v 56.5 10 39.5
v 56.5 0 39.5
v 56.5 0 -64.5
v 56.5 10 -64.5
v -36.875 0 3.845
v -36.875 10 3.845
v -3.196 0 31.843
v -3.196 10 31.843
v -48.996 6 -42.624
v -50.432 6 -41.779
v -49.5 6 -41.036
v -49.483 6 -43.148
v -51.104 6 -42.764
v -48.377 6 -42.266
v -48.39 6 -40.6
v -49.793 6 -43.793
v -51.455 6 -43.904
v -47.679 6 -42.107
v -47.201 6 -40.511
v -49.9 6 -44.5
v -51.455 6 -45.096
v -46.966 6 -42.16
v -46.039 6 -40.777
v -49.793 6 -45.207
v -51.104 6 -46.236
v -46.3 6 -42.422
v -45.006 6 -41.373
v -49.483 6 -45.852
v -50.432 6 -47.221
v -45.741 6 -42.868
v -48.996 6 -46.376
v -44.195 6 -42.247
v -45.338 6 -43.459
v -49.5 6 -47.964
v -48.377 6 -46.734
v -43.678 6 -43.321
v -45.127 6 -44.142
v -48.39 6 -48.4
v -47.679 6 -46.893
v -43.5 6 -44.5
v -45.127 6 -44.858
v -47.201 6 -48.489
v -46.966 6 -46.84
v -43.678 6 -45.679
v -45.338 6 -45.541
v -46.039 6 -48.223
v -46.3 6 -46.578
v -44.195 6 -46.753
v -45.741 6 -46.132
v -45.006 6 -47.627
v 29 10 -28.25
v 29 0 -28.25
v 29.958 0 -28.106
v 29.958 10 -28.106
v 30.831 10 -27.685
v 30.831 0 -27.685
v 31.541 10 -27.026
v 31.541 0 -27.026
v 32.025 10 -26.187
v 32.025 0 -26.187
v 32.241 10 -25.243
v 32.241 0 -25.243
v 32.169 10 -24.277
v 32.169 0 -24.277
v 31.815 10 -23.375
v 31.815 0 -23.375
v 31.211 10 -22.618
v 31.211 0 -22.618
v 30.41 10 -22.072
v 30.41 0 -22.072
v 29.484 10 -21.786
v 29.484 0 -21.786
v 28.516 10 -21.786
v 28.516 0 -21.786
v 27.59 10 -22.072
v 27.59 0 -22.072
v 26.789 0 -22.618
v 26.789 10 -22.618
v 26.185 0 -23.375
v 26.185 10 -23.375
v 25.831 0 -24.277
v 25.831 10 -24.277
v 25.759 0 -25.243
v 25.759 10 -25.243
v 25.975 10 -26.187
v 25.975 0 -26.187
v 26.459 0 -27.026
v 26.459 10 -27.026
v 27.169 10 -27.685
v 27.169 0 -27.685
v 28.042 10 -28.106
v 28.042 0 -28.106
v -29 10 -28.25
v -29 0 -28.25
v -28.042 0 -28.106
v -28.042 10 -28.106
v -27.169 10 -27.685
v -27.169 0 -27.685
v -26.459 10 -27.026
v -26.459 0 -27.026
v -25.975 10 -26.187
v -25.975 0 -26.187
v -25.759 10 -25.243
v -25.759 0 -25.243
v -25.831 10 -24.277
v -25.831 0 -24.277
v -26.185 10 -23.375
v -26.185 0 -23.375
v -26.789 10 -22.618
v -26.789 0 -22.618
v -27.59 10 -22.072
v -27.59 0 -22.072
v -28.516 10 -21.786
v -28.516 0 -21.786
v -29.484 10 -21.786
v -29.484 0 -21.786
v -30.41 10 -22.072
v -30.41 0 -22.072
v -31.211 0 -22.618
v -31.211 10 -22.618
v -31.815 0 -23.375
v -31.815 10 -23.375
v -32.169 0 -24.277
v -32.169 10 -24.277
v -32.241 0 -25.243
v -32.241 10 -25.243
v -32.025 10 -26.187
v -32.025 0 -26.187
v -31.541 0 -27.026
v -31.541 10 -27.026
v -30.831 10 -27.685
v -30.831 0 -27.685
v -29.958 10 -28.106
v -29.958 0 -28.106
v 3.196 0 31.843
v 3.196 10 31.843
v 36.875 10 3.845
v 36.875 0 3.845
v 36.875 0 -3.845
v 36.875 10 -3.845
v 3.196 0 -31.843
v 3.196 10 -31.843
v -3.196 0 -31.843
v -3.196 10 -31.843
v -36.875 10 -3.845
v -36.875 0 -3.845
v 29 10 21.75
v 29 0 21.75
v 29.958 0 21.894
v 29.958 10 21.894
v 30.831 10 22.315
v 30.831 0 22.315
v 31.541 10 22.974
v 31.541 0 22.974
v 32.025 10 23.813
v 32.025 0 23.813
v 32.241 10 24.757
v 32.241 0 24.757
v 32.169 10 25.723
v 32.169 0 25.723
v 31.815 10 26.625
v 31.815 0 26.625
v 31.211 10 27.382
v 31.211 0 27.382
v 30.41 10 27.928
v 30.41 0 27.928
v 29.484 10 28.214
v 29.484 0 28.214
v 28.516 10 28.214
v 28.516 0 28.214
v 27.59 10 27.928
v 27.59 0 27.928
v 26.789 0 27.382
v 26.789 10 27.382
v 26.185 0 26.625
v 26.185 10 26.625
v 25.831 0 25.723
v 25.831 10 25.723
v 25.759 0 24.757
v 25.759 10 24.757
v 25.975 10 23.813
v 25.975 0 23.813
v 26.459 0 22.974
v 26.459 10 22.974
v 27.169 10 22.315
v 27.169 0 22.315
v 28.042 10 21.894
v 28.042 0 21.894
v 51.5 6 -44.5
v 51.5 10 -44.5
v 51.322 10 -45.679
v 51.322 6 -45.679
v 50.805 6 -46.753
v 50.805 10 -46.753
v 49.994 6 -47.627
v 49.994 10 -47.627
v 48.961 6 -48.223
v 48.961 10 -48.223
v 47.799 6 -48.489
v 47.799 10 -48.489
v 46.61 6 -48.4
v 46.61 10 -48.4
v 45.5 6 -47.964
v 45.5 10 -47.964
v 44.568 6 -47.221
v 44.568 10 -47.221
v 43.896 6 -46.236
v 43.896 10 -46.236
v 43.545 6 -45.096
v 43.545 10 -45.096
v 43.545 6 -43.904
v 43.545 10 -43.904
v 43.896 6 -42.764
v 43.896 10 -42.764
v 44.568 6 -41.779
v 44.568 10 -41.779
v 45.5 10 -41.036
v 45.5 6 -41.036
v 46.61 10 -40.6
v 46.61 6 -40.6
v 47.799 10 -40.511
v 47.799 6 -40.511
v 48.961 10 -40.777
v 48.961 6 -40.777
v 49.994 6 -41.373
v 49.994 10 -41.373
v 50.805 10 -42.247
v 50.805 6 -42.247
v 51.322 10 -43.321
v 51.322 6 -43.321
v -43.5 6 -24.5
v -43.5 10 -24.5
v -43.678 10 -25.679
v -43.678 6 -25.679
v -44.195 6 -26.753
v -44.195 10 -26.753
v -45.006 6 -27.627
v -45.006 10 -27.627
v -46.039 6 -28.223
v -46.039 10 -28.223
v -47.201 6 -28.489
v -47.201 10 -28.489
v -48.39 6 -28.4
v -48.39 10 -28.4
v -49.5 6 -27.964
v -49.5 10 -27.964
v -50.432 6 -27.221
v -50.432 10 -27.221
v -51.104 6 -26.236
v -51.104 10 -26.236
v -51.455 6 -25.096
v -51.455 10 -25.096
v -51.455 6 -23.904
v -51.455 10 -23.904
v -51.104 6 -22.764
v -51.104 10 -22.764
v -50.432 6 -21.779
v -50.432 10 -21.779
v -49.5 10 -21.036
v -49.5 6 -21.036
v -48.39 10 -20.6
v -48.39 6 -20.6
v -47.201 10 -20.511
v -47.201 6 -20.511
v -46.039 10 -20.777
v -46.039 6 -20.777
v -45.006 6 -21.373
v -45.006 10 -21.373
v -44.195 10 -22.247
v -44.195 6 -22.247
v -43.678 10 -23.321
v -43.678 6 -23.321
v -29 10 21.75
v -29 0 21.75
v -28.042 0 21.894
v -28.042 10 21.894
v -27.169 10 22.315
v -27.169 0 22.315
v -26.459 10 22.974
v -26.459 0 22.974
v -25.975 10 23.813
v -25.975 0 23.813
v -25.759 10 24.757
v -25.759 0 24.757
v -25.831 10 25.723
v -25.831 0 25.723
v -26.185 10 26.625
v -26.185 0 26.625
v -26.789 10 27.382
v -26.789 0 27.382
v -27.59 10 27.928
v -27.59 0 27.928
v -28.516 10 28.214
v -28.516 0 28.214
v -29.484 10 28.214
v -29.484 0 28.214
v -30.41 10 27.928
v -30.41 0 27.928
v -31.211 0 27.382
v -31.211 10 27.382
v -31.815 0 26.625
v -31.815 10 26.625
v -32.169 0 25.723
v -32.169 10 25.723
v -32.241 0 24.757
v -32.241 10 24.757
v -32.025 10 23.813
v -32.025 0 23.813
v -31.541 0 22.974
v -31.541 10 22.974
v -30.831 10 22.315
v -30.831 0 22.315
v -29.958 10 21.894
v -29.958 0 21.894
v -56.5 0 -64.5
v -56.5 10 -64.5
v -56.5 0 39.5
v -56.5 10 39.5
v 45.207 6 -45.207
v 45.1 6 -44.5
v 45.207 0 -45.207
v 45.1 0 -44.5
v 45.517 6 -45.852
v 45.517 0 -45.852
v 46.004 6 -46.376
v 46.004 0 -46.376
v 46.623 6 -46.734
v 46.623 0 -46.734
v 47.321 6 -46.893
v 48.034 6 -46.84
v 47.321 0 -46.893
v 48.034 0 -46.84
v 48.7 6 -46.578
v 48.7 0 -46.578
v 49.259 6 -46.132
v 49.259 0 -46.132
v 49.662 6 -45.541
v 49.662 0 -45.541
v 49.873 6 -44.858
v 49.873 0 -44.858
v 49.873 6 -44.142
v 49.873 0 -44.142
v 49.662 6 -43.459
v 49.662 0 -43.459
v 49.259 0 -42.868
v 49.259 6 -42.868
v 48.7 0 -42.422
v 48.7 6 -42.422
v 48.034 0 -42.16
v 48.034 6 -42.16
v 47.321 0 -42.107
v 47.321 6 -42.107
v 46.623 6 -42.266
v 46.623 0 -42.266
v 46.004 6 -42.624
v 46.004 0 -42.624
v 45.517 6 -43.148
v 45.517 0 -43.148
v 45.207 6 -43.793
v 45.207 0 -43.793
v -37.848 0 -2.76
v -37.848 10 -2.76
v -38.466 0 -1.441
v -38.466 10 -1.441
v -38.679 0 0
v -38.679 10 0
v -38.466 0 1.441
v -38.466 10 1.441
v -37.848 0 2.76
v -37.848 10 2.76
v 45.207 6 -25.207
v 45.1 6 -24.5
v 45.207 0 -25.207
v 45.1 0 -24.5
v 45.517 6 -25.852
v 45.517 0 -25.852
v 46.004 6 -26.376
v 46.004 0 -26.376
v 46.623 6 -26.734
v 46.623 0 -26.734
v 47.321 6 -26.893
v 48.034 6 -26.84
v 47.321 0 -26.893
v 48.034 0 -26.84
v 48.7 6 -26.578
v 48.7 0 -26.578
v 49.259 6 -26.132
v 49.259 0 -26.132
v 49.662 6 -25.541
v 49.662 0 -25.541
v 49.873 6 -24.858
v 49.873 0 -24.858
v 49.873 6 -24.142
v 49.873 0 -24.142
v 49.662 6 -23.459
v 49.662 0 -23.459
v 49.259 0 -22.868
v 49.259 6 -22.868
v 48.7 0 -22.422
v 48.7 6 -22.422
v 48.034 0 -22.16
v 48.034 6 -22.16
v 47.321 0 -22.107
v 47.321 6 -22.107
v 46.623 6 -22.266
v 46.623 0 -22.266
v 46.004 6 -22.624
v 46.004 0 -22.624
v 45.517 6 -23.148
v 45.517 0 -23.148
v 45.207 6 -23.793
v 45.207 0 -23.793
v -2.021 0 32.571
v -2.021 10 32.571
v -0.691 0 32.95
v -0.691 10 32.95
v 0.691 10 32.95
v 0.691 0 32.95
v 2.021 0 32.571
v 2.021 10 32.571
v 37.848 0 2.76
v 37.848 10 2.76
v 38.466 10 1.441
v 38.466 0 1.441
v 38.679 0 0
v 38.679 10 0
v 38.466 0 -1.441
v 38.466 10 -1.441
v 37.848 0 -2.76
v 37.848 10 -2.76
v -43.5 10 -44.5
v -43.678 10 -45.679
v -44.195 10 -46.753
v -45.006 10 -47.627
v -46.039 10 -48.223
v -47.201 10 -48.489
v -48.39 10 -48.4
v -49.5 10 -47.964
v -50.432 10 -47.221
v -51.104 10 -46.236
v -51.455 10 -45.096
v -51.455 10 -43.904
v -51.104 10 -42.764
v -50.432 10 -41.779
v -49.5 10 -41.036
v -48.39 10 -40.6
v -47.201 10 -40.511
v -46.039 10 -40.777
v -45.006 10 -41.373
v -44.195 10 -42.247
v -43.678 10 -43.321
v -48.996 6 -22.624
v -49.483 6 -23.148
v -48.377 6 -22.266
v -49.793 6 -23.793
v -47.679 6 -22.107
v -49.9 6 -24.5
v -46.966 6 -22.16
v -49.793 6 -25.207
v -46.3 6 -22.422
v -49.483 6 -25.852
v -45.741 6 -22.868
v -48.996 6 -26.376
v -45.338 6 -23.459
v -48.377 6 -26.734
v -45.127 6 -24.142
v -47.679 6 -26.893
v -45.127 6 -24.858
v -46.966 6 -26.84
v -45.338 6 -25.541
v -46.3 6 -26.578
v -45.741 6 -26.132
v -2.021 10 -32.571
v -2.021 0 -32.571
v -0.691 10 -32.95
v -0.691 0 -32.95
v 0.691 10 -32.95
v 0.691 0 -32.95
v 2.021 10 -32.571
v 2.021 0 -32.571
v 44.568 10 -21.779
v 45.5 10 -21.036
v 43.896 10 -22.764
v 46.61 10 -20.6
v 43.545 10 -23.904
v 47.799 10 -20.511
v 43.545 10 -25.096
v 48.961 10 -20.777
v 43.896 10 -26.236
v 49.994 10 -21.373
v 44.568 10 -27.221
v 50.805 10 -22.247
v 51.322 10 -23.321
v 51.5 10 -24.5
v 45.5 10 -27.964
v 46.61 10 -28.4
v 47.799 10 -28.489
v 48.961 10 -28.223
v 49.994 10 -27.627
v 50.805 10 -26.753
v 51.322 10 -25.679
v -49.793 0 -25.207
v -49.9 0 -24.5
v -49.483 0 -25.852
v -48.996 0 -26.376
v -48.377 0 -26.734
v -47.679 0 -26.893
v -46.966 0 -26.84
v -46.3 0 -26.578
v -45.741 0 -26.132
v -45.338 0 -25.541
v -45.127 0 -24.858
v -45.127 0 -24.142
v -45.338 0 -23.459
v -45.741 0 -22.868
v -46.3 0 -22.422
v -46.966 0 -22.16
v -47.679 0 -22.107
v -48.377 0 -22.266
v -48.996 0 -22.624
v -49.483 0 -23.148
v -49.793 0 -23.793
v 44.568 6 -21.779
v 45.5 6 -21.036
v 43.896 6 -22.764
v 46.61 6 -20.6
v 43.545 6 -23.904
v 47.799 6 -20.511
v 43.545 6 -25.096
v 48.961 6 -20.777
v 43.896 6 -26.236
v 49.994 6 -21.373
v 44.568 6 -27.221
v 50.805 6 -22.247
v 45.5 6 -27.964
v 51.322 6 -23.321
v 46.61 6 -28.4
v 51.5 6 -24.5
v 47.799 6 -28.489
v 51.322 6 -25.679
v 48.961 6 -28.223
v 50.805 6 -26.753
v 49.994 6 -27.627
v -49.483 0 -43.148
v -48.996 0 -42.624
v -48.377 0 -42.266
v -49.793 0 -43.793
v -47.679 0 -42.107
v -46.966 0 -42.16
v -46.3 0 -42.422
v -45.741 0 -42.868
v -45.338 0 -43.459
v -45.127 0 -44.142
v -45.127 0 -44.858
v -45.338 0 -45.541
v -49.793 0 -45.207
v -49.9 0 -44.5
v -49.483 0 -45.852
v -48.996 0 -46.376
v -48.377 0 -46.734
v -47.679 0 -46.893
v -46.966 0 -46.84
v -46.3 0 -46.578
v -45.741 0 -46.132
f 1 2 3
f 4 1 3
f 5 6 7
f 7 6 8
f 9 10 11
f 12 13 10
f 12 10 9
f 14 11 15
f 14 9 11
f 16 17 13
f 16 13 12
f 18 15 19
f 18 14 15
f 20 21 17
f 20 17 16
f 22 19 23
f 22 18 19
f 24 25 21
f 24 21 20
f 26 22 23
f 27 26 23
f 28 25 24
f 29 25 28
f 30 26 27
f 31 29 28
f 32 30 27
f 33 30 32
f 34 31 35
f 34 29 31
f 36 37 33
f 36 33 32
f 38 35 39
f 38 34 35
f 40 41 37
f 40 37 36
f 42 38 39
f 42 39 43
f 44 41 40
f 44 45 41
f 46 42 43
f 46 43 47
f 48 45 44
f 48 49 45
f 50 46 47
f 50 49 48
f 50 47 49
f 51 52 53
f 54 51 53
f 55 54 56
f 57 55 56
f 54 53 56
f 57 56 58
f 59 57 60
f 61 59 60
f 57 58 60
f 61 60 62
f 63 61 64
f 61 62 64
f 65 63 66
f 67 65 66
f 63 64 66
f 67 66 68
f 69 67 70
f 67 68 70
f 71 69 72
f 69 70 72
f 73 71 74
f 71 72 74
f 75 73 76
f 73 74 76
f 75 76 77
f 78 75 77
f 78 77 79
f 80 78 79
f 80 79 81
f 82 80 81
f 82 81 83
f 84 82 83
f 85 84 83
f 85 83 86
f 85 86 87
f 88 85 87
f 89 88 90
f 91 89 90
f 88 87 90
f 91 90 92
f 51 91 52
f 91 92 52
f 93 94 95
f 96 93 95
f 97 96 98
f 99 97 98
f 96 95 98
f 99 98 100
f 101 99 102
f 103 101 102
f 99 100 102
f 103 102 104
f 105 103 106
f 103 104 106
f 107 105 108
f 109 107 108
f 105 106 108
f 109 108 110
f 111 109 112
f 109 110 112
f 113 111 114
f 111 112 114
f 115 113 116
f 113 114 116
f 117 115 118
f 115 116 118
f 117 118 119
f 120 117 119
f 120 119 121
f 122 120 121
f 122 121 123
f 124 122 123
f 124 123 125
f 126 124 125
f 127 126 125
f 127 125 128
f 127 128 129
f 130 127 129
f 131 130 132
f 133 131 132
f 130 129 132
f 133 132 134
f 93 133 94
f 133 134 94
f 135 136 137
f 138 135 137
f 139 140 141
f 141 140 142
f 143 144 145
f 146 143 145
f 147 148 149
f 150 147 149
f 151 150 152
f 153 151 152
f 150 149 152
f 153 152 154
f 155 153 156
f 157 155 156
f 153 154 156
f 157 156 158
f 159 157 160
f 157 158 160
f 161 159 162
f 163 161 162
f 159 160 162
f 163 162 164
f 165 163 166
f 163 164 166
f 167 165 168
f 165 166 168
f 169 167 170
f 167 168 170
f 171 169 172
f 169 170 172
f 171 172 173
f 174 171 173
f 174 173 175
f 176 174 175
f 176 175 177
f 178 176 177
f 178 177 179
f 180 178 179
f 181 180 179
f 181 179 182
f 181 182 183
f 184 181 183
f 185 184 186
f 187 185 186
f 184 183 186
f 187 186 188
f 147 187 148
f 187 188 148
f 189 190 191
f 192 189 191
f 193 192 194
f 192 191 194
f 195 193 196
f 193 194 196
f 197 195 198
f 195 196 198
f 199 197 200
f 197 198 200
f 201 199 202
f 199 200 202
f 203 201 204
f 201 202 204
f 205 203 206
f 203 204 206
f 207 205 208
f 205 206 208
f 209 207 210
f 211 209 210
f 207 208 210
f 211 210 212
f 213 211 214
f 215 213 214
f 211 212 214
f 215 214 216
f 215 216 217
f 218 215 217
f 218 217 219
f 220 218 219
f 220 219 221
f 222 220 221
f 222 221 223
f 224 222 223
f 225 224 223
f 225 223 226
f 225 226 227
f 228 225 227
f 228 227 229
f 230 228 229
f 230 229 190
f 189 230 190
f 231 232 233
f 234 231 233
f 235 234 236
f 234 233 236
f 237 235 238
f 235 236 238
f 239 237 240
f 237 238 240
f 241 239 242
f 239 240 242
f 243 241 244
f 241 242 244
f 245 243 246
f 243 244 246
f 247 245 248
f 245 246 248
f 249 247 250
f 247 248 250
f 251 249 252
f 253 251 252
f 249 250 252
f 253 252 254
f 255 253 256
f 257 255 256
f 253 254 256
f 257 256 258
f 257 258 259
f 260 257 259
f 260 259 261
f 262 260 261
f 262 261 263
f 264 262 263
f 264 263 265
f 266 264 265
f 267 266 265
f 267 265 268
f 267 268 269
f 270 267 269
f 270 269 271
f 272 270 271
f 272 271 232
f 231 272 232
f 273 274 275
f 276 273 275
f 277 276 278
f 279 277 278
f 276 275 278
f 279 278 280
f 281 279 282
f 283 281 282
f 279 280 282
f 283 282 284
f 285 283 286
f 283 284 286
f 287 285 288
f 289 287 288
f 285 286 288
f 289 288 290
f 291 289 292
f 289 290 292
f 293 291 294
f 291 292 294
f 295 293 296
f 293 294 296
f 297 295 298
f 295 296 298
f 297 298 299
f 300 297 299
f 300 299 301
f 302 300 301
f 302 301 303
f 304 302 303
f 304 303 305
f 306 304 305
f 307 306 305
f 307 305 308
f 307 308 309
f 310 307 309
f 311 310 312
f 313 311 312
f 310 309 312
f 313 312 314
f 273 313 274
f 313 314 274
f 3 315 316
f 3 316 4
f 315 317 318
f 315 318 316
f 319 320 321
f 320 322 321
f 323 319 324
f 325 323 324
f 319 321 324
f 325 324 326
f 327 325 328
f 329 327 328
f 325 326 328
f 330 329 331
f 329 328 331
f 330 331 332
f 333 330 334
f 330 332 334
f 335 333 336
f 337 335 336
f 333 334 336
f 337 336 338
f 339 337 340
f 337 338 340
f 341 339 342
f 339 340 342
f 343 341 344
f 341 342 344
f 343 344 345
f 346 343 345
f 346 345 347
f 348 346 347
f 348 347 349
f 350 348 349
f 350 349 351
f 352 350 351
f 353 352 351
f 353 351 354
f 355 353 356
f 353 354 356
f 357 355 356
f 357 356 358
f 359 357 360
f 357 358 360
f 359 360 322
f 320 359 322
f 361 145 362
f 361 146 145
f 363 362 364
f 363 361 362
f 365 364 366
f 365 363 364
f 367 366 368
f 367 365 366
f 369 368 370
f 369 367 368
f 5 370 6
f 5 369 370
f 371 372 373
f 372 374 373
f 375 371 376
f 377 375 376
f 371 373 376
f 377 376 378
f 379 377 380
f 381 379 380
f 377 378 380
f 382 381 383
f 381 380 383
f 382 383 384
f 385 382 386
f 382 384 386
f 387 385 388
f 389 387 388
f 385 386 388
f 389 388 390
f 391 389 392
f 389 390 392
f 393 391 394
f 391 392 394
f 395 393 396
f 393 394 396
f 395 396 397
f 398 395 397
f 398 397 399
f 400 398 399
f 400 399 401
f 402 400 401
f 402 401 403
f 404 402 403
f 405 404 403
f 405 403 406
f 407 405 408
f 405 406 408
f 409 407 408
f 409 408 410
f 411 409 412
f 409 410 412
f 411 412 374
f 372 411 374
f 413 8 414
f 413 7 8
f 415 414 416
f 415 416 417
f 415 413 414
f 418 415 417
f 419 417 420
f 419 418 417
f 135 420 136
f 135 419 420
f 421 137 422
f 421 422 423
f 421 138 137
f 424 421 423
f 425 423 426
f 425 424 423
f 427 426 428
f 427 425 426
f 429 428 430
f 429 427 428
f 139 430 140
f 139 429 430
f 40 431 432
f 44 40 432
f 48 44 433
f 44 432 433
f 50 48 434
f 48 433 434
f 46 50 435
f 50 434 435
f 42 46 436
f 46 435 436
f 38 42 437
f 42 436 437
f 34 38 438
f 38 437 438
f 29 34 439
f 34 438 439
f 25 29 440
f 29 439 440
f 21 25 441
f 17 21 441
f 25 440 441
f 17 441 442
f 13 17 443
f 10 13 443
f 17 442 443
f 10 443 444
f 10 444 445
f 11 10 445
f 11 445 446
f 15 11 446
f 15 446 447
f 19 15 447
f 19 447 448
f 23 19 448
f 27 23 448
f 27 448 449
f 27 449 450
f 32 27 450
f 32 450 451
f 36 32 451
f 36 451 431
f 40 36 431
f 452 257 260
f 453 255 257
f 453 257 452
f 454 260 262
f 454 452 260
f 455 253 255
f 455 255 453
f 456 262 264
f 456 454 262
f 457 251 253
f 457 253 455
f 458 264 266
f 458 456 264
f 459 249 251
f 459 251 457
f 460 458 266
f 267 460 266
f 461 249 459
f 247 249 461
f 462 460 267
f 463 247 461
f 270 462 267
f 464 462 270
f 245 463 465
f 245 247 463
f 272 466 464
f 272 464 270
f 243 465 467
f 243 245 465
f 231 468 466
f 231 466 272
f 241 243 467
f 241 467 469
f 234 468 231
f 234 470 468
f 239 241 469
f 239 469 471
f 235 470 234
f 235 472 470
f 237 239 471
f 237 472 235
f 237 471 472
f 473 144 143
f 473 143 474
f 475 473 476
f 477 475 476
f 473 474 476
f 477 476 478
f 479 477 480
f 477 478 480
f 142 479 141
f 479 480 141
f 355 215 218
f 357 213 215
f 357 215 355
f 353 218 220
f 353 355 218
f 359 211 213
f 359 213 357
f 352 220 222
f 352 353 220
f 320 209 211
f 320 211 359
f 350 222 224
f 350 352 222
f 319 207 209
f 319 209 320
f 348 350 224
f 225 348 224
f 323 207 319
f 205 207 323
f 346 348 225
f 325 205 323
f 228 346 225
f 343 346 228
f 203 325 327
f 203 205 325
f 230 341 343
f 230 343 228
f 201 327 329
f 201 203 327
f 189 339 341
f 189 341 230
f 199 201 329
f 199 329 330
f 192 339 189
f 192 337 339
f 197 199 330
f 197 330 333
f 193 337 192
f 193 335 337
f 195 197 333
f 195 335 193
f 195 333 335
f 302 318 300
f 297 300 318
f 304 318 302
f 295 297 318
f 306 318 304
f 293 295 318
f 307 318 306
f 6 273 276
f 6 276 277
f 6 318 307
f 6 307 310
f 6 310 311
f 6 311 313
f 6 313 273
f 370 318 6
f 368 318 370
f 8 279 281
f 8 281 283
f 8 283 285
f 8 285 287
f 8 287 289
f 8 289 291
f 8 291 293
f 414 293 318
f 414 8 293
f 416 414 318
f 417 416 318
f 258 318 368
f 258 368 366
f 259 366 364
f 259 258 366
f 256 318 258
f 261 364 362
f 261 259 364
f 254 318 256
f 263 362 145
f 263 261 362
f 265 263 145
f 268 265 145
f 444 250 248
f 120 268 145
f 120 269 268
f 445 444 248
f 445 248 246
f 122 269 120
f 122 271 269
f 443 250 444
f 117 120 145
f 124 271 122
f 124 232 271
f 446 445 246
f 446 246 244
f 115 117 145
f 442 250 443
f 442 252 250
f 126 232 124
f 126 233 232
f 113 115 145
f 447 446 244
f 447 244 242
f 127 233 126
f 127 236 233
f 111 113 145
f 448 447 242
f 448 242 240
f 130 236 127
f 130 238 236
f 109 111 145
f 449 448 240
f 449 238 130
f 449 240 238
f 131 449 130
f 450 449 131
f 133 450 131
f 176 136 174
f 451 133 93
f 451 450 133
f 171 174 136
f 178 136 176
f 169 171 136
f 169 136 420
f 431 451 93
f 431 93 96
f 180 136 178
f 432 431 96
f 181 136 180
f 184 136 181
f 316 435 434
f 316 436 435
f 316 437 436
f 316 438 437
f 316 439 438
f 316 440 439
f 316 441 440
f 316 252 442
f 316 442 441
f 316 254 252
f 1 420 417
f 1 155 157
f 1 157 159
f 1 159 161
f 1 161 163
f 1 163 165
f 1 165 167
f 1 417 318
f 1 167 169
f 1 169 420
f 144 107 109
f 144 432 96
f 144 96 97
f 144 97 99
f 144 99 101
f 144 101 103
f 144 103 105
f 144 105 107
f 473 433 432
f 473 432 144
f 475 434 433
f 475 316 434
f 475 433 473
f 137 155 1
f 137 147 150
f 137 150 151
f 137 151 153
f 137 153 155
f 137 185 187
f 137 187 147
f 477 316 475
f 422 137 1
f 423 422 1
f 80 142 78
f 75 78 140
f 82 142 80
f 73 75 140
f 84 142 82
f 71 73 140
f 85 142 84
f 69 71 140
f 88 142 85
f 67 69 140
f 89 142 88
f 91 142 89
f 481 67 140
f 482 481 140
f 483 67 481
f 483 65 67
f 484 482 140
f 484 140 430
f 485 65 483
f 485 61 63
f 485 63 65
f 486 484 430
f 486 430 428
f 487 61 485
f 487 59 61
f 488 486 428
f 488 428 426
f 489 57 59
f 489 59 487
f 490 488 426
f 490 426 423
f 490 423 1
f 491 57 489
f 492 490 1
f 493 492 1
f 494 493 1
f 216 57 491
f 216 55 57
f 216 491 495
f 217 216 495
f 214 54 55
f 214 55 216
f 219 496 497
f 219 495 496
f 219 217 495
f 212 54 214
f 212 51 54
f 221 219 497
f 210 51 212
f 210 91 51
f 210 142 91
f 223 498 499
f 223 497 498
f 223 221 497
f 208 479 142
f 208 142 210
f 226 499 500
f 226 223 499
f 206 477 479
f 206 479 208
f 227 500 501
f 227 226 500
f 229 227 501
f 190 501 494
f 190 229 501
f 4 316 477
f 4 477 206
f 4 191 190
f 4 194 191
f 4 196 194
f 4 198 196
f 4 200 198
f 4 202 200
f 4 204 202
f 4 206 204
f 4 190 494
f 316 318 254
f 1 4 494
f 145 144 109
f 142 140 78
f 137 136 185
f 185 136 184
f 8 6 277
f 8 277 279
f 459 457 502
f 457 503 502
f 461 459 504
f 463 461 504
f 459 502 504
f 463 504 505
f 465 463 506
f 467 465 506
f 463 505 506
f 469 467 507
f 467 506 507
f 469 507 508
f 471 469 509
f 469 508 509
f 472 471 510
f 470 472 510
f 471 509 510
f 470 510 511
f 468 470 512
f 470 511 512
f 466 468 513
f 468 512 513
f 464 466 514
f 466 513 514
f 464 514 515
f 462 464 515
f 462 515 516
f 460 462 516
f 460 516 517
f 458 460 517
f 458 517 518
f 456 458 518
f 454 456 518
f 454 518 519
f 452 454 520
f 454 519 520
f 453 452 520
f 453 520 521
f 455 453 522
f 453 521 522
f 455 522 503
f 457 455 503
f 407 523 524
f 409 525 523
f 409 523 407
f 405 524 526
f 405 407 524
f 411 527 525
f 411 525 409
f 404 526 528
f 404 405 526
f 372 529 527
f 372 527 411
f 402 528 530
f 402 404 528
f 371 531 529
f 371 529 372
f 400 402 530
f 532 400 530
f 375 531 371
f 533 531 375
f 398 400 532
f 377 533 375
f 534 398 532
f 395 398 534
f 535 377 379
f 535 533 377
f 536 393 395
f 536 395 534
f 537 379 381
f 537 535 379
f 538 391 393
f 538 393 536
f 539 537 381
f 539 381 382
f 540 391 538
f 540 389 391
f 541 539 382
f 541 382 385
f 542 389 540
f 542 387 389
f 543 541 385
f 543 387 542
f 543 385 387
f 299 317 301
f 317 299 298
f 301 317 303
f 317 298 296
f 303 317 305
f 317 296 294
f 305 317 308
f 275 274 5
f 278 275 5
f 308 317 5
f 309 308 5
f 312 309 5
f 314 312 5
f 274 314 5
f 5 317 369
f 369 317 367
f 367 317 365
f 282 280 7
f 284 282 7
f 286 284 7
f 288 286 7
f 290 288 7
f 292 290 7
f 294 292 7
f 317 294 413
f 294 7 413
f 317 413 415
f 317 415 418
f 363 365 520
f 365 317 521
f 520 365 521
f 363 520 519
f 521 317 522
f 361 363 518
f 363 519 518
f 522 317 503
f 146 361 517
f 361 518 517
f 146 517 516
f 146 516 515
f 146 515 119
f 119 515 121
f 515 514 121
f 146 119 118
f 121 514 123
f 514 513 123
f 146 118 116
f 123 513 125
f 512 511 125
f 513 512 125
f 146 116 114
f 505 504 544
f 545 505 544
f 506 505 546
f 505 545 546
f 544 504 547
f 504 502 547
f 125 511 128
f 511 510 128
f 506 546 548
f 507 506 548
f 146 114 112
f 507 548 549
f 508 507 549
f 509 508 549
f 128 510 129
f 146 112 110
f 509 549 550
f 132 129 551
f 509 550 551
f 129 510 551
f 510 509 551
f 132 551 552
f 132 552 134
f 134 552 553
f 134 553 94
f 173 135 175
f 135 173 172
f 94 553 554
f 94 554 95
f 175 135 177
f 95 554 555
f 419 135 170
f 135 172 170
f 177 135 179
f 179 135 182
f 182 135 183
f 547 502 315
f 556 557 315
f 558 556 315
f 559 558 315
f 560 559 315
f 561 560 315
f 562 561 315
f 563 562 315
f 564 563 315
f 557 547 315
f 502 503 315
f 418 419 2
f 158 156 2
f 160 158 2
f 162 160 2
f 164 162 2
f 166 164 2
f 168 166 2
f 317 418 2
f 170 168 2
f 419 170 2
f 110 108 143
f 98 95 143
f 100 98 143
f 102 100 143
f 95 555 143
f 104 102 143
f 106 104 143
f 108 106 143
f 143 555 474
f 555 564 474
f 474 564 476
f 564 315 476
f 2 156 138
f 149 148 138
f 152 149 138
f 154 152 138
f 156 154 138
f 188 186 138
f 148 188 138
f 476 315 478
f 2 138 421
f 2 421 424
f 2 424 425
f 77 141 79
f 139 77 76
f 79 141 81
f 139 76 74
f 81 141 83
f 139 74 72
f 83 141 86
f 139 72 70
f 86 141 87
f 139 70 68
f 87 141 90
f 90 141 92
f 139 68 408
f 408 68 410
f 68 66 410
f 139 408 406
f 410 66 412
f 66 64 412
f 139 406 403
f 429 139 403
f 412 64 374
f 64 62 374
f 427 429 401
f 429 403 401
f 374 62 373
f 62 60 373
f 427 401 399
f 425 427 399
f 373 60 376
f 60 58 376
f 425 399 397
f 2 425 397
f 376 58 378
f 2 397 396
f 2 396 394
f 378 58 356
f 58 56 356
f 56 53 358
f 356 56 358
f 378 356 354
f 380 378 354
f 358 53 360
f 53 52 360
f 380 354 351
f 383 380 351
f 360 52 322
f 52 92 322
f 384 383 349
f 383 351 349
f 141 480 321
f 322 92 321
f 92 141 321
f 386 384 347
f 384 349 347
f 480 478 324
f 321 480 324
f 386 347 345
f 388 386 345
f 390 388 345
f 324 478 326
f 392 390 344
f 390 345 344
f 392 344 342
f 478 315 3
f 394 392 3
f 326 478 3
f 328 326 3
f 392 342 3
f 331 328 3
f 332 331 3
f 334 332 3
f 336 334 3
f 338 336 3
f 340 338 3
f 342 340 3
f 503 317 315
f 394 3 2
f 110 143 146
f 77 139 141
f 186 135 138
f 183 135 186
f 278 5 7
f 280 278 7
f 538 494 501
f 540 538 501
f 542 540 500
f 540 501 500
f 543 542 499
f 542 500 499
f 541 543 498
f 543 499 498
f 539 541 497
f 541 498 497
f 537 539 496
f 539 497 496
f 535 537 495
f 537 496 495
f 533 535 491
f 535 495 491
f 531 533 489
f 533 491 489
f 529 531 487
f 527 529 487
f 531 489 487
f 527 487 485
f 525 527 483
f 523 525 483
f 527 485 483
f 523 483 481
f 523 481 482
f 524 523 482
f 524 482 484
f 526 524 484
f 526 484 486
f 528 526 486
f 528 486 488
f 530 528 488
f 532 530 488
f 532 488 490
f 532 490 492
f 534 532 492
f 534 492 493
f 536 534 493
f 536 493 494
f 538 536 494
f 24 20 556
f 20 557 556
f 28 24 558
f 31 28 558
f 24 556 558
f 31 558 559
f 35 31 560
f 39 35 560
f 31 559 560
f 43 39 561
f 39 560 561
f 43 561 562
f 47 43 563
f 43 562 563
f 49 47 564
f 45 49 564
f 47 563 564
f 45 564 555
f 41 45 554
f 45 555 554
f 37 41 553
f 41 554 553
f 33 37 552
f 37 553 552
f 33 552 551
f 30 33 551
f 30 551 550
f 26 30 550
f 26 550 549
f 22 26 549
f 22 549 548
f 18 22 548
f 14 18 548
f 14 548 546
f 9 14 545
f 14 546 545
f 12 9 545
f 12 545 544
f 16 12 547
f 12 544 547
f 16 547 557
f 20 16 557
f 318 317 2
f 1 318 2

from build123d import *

# Parameters (mm, degrees)
SKETCH2_W                      = 113
SKETCH2_H                      = 104
TOP_FACE_DEPTH                 = 10
SKETCH3_R                      = 3.25
CUT_EXTRUDE1_DEPTH             = 10
CUT_EXTRUDE2_DEPTH             = 10
FILLET1_R                      = 5
CBORE_FOR_M4_SHCS1_D           = 4.8
CBORE_FOR_M4_SHCS1_CBORE_D     = 8
CBORE_FOR_M4_SHCS1_CBORE_DEPTH = 4


with BuildPart() as part:
    # Sketch2 → Top Face (new body)
    with BuildSketch(Plane(origin=(0, 0, 0), x_dir=(1, 0, 0), z_dir=(0, 1, 0))):
        with Locations((0, 12.5)):
            Rectangle(SKETCH2_W, SKETCH2_H)
    extrude(amount=TOP_FACE_DEPTH)

    # Sketch3 → Cut-Extrude1 (cut)
    with BuildSketch(Plane.XZ):
        with Locations(Location((-29, 25, 0), (0, 0, 270))):
            Circle(SKETCH3_R)
        with Locations(Location((-29, -25, 0), (0, 0, 270))):
            Circle(SKETCH3_R)
        with Locations(Location((29, -25, 0), (0, 0, 270))):
            Circle(SKETCH3_R)
        with Locations(Location((29, 25, 0), (0, 0, 270))):
            Circle(SKETCH3_R)
    extrude(amount=-CUT_EXTRUDE1_DEPTH, mode=Mode.SUBTRACT)

    # Sketch4 → Cut-Extrude2 (cut)
    with BuildSketch(Plane(origin=(0, 10, 0), x_dir=(1, 0, 0), z_dir=(0, 1, 0))):
        Polygon((0, 34.5), (-41.5, 0), (0, -34.5), (41.5, 0), align=None)
    extrude(amount=-CUT_EXTRUDE2_DEPTH, mode=Mode.SUBTRACT)

    # Fillet1
    fillet1_edges = [part.edges().sort_by_distance(p)[0] for p in [
        (0, 5, -34.5),
        (41.5, 5, 0),
        (0, 5, 34.5),
        (-41.5, 5, 0),
    ]]
    fillet(fillet1_edges, radius=FILLET1_R)

    # CBORE for M4 SHCS1 (through all)
    with Locations(Plane(origin=(0, 10, 0), x_dir=(1, 0, 0), z_dir=(0, 1, 0))):
        with Locations((47.5, 44.5), (47.5, 24.5), (-47.5, 24.5), (-47.5, 44.5)):
            CounterBoreHole(CBORE_FOR_M4_SHCS1_D / 2, CBORE_FOR_M4_SHCS1_CBORE_D / 2, CBORE_FOR_M4_SHCS1_CBORE_DEPTH)


solid = part.part
